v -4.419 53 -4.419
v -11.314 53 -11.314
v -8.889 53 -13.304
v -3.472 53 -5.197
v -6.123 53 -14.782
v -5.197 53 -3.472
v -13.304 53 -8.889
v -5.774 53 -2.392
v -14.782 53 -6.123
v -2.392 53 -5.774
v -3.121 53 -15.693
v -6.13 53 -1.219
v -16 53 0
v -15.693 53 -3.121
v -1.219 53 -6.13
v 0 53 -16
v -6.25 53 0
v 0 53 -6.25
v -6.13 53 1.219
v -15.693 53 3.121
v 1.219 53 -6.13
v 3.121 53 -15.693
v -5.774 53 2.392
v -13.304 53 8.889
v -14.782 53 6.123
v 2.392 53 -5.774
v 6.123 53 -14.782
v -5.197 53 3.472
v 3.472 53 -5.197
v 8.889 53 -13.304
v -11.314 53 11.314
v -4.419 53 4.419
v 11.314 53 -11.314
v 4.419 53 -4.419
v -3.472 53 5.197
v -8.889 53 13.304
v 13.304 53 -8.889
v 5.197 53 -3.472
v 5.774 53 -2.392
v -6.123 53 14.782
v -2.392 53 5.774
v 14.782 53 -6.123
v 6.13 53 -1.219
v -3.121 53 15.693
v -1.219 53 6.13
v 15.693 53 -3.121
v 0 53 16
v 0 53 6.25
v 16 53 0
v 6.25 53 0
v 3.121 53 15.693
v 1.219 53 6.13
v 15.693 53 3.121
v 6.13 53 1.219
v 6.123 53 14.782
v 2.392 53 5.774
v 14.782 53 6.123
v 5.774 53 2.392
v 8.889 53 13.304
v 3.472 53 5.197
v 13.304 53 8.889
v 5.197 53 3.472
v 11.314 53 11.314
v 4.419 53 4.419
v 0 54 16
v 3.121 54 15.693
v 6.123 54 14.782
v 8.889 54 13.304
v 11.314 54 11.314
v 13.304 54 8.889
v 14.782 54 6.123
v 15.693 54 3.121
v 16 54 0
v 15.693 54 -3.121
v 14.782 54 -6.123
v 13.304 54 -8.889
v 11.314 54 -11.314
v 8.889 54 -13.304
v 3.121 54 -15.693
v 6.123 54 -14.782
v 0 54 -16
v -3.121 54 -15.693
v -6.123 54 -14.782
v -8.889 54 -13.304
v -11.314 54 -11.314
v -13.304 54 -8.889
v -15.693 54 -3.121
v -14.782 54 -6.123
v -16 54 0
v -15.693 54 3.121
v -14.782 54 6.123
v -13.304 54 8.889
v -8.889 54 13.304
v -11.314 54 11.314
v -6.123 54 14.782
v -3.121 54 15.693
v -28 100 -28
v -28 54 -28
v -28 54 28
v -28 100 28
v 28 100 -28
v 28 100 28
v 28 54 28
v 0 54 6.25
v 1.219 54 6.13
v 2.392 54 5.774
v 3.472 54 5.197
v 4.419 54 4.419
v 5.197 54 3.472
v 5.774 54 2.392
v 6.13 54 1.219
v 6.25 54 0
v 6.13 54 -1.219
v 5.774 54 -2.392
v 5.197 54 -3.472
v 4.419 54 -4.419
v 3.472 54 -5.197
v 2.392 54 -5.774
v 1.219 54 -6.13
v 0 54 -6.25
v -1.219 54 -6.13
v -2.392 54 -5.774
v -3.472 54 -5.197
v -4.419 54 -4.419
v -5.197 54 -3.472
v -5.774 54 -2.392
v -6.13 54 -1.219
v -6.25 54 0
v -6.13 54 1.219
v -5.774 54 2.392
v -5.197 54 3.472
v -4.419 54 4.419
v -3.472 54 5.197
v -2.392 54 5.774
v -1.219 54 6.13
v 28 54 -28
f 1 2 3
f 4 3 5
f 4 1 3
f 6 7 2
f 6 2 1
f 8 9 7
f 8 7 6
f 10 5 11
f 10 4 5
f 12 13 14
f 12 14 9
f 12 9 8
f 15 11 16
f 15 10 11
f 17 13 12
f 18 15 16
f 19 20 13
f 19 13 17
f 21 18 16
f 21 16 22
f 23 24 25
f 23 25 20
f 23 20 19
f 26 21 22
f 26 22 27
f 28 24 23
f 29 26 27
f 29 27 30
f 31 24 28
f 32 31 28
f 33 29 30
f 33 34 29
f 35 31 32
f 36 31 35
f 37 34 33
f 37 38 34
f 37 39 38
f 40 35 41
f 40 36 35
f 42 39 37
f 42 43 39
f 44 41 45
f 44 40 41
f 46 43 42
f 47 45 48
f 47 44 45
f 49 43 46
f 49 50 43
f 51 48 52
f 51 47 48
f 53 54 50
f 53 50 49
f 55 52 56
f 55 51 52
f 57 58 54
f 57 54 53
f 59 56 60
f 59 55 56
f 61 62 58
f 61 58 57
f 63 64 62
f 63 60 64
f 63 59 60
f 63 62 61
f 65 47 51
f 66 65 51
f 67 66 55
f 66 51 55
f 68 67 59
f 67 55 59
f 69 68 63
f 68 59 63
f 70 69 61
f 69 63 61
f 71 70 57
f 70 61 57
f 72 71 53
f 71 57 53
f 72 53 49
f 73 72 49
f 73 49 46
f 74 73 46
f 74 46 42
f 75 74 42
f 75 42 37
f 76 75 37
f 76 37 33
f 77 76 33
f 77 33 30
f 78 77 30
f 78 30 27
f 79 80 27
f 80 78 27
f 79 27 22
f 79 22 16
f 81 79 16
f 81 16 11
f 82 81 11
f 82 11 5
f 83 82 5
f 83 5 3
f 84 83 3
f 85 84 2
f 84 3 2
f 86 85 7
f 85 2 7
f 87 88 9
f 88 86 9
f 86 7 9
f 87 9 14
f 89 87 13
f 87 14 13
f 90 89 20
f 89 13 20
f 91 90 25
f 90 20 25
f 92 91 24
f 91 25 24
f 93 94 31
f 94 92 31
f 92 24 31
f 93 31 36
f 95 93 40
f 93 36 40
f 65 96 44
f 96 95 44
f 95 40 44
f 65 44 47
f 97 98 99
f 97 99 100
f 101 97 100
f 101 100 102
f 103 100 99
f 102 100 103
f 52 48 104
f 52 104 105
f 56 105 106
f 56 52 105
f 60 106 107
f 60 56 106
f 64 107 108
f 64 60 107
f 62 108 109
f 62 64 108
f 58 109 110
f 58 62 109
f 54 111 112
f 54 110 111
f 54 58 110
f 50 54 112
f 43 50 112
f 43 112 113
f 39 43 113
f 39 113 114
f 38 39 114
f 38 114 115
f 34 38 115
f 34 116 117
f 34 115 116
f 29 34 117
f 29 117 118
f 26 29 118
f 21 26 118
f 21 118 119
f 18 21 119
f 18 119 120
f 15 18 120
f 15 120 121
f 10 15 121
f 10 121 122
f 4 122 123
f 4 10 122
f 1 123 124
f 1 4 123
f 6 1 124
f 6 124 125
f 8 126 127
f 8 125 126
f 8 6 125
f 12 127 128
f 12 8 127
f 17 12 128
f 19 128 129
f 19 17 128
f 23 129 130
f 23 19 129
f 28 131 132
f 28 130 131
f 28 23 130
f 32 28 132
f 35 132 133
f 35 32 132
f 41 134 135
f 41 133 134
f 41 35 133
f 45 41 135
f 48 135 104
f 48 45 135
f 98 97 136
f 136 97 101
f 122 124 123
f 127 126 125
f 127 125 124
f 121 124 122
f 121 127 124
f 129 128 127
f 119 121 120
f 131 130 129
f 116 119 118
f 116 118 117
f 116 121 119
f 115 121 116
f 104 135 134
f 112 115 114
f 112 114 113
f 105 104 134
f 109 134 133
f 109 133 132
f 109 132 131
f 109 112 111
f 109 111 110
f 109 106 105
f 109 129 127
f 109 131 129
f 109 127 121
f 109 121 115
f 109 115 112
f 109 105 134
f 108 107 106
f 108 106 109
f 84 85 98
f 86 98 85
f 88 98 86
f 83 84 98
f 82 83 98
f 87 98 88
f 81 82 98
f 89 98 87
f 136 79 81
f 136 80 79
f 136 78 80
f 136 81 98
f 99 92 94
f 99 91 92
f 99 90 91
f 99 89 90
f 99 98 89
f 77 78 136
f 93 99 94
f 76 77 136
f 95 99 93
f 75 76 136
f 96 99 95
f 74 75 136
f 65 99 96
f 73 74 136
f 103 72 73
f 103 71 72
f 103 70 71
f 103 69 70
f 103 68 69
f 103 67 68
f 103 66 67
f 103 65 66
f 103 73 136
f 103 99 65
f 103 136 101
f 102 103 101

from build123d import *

# Parameters (mm, degrees)
SKETCH1_R           = 16
SKETCH1_R_2         = 6.25
BOSS_EXTRUDE1_DEPTH = 100
SKETCH2_W           = 40
SKETCH2_H           = 55
CUT_EXTRUDE1_DEPTH  = 20
SKETCH3_W           = 56
SKETCH3_H           = 46
BOSS_EXTRUDE2_DEPTH = 28
SKETCH4_R           = 8
BOSS_EXTRUDE3_DEPTH = 26


with BuildPart() as part:
    # Sketch1 → Boss-Extrude1 (new body)
    with BuildSketch(Plane(origin=(0, 0, 0), x_dir=(1, 0, 0), z_dir=(0, 1, 0))):
        with Locations(Location((0, 0, 0), (0, 0, 270))):
            Circle(SKETCH1_R)
        with Locations(Location((0, 0, 0), (0, 0, 270))):
            Circle(SKETCH1_R_2, mode=Mode.SUBTRACT)
    extrude(amount=BOSS_EXTRUDE1_DEPTH)

    # Sketch2 → Cut-Extrude1 (cut, symmetric)
    with BuildSketch(Plane.XY):
        with Locations((0, 25.5)):
            Rectangle(SKETCH2_W, SKETCH2_H)
    extrude(amount=CUT_EXTRUDE1_DEPTH, both=True, mode=Mode.SUBTRACT)

    # Sketch3 → Boss-Extrude2 (add, symmetric)
    with BuildSketch(Plane.XY):
        with Locations((0, 77)):
            Rectangle(SKETCH3_W, SKETCH3_H)
    extrude(amount=BOSS_EXTRUDE2_DEPTH, both=True)

    # Sketch4 → Boss-Extrude3 (add, symmetric)
    with BuildSketch(Plane.XY):
        with Locations((0, 76)):
            Circle(SKETCH4_R)
    extrude(amount=BOSS_EXTRUDE3_DEPTH, both=True)


solid = part.part
